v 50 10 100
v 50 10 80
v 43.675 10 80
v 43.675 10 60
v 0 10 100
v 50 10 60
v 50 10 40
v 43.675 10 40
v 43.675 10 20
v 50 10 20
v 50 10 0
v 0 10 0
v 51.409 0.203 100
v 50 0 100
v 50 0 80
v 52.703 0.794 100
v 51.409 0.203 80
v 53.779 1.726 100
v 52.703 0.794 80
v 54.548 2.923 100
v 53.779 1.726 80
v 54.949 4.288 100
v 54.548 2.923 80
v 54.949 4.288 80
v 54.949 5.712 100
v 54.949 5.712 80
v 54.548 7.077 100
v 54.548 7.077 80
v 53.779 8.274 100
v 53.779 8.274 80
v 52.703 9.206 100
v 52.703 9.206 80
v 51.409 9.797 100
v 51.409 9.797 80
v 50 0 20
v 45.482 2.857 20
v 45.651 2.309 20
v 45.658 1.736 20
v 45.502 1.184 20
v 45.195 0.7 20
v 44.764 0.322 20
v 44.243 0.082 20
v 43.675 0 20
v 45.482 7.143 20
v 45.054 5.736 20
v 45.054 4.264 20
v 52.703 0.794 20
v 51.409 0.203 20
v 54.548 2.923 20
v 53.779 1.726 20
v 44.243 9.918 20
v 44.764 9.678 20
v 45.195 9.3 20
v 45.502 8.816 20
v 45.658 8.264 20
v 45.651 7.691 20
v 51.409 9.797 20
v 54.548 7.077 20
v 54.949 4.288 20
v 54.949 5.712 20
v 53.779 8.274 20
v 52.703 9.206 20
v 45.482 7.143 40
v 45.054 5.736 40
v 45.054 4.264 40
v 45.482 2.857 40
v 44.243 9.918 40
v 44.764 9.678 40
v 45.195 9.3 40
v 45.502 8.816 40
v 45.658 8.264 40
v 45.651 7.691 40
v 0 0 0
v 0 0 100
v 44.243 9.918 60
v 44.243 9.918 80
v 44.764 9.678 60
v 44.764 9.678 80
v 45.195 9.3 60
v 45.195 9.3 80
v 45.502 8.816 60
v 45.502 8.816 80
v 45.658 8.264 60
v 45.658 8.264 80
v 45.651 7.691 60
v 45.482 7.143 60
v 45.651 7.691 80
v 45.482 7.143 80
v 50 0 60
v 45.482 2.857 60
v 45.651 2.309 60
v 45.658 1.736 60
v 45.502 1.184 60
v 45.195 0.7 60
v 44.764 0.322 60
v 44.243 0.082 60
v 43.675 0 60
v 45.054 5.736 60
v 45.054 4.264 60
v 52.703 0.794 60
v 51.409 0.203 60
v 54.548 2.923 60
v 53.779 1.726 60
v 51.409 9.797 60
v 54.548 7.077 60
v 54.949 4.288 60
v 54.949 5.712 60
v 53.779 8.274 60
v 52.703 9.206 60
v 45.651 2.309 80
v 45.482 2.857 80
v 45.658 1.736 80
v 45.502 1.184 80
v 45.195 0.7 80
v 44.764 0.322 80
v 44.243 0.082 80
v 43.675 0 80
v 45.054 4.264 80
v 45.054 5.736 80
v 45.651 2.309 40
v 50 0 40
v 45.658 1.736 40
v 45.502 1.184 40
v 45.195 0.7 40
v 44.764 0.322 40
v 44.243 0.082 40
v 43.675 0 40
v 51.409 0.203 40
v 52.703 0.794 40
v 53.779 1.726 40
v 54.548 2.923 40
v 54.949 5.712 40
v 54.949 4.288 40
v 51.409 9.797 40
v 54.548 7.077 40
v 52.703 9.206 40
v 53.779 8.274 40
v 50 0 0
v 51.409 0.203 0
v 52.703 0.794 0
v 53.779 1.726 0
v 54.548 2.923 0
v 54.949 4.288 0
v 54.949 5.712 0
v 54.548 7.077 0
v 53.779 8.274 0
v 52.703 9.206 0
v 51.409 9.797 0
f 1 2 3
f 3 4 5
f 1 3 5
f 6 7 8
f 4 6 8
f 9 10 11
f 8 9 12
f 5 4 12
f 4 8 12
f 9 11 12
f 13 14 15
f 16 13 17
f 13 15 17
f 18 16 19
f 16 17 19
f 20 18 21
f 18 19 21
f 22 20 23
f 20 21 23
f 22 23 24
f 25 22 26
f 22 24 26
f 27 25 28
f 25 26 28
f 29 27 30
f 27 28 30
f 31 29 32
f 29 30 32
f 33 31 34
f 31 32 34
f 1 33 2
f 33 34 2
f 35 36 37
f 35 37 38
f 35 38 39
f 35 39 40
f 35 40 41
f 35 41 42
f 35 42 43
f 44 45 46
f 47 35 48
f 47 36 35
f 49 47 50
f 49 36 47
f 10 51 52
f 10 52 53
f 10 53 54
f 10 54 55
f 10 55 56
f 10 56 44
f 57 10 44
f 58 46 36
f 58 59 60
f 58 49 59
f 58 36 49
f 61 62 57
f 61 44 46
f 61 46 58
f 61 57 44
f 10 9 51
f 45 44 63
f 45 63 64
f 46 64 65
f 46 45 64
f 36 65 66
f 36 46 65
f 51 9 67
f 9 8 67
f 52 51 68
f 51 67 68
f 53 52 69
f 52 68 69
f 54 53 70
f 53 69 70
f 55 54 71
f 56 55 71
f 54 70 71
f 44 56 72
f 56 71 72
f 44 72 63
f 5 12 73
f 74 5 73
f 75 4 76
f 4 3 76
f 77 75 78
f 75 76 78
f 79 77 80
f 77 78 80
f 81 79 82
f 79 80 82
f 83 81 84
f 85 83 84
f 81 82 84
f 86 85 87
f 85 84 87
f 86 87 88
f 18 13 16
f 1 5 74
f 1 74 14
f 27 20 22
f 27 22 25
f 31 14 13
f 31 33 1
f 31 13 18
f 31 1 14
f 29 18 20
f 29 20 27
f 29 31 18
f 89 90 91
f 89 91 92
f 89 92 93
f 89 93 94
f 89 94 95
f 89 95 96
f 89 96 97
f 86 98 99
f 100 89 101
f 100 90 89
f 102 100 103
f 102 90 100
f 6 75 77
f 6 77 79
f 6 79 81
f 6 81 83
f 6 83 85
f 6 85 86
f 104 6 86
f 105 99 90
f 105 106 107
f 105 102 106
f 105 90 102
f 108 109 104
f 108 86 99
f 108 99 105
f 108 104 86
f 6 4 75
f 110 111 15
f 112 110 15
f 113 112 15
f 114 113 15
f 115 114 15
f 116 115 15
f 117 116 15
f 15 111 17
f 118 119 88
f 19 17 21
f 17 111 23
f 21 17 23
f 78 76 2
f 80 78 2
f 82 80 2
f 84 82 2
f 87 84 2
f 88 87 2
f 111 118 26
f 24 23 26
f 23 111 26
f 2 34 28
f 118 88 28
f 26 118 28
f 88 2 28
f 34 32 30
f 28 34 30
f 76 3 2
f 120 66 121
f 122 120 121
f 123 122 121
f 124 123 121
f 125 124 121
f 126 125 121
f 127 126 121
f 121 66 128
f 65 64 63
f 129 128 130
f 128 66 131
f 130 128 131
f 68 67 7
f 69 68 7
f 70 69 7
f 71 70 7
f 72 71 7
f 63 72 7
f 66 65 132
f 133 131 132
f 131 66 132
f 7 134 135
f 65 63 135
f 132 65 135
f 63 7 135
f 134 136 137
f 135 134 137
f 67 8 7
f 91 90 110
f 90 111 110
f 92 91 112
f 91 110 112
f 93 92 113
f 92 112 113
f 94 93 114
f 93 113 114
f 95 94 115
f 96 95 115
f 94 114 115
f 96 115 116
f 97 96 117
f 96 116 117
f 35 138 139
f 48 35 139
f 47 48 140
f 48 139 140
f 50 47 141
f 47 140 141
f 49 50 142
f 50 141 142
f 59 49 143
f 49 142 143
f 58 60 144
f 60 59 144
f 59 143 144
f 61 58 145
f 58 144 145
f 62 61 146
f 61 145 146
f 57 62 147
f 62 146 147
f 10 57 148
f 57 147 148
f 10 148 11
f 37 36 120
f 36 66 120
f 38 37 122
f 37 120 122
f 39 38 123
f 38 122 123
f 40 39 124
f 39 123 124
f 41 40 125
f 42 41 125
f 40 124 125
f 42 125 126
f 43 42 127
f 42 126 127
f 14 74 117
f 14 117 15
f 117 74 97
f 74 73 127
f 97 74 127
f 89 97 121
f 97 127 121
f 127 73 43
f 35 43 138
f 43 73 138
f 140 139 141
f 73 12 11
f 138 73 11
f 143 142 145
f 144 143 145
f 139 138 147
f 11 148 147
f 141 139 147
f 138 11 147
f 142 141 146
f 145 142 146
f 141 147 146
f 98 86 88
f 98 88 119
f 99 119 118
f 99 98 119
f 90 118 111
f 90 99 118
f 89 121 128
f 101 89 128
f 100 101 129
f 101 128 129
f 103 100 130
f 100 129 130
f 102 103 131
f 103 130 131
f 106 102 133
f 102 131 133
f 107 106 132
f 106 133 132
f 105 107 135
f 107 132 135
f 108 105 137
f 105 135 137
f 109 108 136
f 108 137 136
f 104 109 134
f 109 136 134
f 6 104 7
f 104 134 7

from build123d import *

# Parameters (mm, degrees)
SKETCH1_R      = 4.999999999999997
EXTRUDE1_DEPTH = 100
EXTRUDE3_START = 20
SKETCH1_5_R    = 4.999999999999997
EXTRUDE3_DEPTH = 20
EXTRUDE5_START = 60
SKETCH1_7_R    = 4.999999999999997
EXTRUDE5_DEPTH = 20
FILLET1_R      = 2


with BuildPart() as part:
    # Sketch1 → Extrude1 (new body)
    with BuildSketch(Plane.XY):
        with Locations((50, 5.000000000000032)):
            Circle(SKETCH1_R)
        Polygon((0, 0), (50, 2.082e-14), (50, 10.00000000000003), (-1.84e-15, 10.00000000000004), align=None)
    extrude(amount=EXTRUDE1_DEPTH)

    # Sketch1<5> → Extrude3 (cut)
    with BuildSketch(Plane.XY.offset(EXTRUDE3_START)):
        with Locations((50, 5.000000000000032)):
            Circle(SKETCH1_5_R)
    extrude(amount=EXTRUDE3_DEPTH, mode=Mode.SUBTRACT)

    # Sketch1<7> → Extrude5 (cut)
    with BuildSketch(Plane.XY.offset(EXTRUDE5_START)):
        with Locations((50, 5.000000000000032)):
            Circle(SKETCH1_7_R)
    extrude(amount=EXTRUDE5_DEPTH, mode=Mode.SUBTRACT)

    # Fillet1
    fillet1_edges = [part.edges().sort_by_distance(p)[0] for p in [
        (50, 10.00000000000003, 30),
        (50, 2.082e-14, 30),
        (50, 2.082e-14, 70),
        (50, 10.00000000000003, 70),
    ]]
    fillet(fillet1_edges, radius=FILLET1_R)


solid = part.part
